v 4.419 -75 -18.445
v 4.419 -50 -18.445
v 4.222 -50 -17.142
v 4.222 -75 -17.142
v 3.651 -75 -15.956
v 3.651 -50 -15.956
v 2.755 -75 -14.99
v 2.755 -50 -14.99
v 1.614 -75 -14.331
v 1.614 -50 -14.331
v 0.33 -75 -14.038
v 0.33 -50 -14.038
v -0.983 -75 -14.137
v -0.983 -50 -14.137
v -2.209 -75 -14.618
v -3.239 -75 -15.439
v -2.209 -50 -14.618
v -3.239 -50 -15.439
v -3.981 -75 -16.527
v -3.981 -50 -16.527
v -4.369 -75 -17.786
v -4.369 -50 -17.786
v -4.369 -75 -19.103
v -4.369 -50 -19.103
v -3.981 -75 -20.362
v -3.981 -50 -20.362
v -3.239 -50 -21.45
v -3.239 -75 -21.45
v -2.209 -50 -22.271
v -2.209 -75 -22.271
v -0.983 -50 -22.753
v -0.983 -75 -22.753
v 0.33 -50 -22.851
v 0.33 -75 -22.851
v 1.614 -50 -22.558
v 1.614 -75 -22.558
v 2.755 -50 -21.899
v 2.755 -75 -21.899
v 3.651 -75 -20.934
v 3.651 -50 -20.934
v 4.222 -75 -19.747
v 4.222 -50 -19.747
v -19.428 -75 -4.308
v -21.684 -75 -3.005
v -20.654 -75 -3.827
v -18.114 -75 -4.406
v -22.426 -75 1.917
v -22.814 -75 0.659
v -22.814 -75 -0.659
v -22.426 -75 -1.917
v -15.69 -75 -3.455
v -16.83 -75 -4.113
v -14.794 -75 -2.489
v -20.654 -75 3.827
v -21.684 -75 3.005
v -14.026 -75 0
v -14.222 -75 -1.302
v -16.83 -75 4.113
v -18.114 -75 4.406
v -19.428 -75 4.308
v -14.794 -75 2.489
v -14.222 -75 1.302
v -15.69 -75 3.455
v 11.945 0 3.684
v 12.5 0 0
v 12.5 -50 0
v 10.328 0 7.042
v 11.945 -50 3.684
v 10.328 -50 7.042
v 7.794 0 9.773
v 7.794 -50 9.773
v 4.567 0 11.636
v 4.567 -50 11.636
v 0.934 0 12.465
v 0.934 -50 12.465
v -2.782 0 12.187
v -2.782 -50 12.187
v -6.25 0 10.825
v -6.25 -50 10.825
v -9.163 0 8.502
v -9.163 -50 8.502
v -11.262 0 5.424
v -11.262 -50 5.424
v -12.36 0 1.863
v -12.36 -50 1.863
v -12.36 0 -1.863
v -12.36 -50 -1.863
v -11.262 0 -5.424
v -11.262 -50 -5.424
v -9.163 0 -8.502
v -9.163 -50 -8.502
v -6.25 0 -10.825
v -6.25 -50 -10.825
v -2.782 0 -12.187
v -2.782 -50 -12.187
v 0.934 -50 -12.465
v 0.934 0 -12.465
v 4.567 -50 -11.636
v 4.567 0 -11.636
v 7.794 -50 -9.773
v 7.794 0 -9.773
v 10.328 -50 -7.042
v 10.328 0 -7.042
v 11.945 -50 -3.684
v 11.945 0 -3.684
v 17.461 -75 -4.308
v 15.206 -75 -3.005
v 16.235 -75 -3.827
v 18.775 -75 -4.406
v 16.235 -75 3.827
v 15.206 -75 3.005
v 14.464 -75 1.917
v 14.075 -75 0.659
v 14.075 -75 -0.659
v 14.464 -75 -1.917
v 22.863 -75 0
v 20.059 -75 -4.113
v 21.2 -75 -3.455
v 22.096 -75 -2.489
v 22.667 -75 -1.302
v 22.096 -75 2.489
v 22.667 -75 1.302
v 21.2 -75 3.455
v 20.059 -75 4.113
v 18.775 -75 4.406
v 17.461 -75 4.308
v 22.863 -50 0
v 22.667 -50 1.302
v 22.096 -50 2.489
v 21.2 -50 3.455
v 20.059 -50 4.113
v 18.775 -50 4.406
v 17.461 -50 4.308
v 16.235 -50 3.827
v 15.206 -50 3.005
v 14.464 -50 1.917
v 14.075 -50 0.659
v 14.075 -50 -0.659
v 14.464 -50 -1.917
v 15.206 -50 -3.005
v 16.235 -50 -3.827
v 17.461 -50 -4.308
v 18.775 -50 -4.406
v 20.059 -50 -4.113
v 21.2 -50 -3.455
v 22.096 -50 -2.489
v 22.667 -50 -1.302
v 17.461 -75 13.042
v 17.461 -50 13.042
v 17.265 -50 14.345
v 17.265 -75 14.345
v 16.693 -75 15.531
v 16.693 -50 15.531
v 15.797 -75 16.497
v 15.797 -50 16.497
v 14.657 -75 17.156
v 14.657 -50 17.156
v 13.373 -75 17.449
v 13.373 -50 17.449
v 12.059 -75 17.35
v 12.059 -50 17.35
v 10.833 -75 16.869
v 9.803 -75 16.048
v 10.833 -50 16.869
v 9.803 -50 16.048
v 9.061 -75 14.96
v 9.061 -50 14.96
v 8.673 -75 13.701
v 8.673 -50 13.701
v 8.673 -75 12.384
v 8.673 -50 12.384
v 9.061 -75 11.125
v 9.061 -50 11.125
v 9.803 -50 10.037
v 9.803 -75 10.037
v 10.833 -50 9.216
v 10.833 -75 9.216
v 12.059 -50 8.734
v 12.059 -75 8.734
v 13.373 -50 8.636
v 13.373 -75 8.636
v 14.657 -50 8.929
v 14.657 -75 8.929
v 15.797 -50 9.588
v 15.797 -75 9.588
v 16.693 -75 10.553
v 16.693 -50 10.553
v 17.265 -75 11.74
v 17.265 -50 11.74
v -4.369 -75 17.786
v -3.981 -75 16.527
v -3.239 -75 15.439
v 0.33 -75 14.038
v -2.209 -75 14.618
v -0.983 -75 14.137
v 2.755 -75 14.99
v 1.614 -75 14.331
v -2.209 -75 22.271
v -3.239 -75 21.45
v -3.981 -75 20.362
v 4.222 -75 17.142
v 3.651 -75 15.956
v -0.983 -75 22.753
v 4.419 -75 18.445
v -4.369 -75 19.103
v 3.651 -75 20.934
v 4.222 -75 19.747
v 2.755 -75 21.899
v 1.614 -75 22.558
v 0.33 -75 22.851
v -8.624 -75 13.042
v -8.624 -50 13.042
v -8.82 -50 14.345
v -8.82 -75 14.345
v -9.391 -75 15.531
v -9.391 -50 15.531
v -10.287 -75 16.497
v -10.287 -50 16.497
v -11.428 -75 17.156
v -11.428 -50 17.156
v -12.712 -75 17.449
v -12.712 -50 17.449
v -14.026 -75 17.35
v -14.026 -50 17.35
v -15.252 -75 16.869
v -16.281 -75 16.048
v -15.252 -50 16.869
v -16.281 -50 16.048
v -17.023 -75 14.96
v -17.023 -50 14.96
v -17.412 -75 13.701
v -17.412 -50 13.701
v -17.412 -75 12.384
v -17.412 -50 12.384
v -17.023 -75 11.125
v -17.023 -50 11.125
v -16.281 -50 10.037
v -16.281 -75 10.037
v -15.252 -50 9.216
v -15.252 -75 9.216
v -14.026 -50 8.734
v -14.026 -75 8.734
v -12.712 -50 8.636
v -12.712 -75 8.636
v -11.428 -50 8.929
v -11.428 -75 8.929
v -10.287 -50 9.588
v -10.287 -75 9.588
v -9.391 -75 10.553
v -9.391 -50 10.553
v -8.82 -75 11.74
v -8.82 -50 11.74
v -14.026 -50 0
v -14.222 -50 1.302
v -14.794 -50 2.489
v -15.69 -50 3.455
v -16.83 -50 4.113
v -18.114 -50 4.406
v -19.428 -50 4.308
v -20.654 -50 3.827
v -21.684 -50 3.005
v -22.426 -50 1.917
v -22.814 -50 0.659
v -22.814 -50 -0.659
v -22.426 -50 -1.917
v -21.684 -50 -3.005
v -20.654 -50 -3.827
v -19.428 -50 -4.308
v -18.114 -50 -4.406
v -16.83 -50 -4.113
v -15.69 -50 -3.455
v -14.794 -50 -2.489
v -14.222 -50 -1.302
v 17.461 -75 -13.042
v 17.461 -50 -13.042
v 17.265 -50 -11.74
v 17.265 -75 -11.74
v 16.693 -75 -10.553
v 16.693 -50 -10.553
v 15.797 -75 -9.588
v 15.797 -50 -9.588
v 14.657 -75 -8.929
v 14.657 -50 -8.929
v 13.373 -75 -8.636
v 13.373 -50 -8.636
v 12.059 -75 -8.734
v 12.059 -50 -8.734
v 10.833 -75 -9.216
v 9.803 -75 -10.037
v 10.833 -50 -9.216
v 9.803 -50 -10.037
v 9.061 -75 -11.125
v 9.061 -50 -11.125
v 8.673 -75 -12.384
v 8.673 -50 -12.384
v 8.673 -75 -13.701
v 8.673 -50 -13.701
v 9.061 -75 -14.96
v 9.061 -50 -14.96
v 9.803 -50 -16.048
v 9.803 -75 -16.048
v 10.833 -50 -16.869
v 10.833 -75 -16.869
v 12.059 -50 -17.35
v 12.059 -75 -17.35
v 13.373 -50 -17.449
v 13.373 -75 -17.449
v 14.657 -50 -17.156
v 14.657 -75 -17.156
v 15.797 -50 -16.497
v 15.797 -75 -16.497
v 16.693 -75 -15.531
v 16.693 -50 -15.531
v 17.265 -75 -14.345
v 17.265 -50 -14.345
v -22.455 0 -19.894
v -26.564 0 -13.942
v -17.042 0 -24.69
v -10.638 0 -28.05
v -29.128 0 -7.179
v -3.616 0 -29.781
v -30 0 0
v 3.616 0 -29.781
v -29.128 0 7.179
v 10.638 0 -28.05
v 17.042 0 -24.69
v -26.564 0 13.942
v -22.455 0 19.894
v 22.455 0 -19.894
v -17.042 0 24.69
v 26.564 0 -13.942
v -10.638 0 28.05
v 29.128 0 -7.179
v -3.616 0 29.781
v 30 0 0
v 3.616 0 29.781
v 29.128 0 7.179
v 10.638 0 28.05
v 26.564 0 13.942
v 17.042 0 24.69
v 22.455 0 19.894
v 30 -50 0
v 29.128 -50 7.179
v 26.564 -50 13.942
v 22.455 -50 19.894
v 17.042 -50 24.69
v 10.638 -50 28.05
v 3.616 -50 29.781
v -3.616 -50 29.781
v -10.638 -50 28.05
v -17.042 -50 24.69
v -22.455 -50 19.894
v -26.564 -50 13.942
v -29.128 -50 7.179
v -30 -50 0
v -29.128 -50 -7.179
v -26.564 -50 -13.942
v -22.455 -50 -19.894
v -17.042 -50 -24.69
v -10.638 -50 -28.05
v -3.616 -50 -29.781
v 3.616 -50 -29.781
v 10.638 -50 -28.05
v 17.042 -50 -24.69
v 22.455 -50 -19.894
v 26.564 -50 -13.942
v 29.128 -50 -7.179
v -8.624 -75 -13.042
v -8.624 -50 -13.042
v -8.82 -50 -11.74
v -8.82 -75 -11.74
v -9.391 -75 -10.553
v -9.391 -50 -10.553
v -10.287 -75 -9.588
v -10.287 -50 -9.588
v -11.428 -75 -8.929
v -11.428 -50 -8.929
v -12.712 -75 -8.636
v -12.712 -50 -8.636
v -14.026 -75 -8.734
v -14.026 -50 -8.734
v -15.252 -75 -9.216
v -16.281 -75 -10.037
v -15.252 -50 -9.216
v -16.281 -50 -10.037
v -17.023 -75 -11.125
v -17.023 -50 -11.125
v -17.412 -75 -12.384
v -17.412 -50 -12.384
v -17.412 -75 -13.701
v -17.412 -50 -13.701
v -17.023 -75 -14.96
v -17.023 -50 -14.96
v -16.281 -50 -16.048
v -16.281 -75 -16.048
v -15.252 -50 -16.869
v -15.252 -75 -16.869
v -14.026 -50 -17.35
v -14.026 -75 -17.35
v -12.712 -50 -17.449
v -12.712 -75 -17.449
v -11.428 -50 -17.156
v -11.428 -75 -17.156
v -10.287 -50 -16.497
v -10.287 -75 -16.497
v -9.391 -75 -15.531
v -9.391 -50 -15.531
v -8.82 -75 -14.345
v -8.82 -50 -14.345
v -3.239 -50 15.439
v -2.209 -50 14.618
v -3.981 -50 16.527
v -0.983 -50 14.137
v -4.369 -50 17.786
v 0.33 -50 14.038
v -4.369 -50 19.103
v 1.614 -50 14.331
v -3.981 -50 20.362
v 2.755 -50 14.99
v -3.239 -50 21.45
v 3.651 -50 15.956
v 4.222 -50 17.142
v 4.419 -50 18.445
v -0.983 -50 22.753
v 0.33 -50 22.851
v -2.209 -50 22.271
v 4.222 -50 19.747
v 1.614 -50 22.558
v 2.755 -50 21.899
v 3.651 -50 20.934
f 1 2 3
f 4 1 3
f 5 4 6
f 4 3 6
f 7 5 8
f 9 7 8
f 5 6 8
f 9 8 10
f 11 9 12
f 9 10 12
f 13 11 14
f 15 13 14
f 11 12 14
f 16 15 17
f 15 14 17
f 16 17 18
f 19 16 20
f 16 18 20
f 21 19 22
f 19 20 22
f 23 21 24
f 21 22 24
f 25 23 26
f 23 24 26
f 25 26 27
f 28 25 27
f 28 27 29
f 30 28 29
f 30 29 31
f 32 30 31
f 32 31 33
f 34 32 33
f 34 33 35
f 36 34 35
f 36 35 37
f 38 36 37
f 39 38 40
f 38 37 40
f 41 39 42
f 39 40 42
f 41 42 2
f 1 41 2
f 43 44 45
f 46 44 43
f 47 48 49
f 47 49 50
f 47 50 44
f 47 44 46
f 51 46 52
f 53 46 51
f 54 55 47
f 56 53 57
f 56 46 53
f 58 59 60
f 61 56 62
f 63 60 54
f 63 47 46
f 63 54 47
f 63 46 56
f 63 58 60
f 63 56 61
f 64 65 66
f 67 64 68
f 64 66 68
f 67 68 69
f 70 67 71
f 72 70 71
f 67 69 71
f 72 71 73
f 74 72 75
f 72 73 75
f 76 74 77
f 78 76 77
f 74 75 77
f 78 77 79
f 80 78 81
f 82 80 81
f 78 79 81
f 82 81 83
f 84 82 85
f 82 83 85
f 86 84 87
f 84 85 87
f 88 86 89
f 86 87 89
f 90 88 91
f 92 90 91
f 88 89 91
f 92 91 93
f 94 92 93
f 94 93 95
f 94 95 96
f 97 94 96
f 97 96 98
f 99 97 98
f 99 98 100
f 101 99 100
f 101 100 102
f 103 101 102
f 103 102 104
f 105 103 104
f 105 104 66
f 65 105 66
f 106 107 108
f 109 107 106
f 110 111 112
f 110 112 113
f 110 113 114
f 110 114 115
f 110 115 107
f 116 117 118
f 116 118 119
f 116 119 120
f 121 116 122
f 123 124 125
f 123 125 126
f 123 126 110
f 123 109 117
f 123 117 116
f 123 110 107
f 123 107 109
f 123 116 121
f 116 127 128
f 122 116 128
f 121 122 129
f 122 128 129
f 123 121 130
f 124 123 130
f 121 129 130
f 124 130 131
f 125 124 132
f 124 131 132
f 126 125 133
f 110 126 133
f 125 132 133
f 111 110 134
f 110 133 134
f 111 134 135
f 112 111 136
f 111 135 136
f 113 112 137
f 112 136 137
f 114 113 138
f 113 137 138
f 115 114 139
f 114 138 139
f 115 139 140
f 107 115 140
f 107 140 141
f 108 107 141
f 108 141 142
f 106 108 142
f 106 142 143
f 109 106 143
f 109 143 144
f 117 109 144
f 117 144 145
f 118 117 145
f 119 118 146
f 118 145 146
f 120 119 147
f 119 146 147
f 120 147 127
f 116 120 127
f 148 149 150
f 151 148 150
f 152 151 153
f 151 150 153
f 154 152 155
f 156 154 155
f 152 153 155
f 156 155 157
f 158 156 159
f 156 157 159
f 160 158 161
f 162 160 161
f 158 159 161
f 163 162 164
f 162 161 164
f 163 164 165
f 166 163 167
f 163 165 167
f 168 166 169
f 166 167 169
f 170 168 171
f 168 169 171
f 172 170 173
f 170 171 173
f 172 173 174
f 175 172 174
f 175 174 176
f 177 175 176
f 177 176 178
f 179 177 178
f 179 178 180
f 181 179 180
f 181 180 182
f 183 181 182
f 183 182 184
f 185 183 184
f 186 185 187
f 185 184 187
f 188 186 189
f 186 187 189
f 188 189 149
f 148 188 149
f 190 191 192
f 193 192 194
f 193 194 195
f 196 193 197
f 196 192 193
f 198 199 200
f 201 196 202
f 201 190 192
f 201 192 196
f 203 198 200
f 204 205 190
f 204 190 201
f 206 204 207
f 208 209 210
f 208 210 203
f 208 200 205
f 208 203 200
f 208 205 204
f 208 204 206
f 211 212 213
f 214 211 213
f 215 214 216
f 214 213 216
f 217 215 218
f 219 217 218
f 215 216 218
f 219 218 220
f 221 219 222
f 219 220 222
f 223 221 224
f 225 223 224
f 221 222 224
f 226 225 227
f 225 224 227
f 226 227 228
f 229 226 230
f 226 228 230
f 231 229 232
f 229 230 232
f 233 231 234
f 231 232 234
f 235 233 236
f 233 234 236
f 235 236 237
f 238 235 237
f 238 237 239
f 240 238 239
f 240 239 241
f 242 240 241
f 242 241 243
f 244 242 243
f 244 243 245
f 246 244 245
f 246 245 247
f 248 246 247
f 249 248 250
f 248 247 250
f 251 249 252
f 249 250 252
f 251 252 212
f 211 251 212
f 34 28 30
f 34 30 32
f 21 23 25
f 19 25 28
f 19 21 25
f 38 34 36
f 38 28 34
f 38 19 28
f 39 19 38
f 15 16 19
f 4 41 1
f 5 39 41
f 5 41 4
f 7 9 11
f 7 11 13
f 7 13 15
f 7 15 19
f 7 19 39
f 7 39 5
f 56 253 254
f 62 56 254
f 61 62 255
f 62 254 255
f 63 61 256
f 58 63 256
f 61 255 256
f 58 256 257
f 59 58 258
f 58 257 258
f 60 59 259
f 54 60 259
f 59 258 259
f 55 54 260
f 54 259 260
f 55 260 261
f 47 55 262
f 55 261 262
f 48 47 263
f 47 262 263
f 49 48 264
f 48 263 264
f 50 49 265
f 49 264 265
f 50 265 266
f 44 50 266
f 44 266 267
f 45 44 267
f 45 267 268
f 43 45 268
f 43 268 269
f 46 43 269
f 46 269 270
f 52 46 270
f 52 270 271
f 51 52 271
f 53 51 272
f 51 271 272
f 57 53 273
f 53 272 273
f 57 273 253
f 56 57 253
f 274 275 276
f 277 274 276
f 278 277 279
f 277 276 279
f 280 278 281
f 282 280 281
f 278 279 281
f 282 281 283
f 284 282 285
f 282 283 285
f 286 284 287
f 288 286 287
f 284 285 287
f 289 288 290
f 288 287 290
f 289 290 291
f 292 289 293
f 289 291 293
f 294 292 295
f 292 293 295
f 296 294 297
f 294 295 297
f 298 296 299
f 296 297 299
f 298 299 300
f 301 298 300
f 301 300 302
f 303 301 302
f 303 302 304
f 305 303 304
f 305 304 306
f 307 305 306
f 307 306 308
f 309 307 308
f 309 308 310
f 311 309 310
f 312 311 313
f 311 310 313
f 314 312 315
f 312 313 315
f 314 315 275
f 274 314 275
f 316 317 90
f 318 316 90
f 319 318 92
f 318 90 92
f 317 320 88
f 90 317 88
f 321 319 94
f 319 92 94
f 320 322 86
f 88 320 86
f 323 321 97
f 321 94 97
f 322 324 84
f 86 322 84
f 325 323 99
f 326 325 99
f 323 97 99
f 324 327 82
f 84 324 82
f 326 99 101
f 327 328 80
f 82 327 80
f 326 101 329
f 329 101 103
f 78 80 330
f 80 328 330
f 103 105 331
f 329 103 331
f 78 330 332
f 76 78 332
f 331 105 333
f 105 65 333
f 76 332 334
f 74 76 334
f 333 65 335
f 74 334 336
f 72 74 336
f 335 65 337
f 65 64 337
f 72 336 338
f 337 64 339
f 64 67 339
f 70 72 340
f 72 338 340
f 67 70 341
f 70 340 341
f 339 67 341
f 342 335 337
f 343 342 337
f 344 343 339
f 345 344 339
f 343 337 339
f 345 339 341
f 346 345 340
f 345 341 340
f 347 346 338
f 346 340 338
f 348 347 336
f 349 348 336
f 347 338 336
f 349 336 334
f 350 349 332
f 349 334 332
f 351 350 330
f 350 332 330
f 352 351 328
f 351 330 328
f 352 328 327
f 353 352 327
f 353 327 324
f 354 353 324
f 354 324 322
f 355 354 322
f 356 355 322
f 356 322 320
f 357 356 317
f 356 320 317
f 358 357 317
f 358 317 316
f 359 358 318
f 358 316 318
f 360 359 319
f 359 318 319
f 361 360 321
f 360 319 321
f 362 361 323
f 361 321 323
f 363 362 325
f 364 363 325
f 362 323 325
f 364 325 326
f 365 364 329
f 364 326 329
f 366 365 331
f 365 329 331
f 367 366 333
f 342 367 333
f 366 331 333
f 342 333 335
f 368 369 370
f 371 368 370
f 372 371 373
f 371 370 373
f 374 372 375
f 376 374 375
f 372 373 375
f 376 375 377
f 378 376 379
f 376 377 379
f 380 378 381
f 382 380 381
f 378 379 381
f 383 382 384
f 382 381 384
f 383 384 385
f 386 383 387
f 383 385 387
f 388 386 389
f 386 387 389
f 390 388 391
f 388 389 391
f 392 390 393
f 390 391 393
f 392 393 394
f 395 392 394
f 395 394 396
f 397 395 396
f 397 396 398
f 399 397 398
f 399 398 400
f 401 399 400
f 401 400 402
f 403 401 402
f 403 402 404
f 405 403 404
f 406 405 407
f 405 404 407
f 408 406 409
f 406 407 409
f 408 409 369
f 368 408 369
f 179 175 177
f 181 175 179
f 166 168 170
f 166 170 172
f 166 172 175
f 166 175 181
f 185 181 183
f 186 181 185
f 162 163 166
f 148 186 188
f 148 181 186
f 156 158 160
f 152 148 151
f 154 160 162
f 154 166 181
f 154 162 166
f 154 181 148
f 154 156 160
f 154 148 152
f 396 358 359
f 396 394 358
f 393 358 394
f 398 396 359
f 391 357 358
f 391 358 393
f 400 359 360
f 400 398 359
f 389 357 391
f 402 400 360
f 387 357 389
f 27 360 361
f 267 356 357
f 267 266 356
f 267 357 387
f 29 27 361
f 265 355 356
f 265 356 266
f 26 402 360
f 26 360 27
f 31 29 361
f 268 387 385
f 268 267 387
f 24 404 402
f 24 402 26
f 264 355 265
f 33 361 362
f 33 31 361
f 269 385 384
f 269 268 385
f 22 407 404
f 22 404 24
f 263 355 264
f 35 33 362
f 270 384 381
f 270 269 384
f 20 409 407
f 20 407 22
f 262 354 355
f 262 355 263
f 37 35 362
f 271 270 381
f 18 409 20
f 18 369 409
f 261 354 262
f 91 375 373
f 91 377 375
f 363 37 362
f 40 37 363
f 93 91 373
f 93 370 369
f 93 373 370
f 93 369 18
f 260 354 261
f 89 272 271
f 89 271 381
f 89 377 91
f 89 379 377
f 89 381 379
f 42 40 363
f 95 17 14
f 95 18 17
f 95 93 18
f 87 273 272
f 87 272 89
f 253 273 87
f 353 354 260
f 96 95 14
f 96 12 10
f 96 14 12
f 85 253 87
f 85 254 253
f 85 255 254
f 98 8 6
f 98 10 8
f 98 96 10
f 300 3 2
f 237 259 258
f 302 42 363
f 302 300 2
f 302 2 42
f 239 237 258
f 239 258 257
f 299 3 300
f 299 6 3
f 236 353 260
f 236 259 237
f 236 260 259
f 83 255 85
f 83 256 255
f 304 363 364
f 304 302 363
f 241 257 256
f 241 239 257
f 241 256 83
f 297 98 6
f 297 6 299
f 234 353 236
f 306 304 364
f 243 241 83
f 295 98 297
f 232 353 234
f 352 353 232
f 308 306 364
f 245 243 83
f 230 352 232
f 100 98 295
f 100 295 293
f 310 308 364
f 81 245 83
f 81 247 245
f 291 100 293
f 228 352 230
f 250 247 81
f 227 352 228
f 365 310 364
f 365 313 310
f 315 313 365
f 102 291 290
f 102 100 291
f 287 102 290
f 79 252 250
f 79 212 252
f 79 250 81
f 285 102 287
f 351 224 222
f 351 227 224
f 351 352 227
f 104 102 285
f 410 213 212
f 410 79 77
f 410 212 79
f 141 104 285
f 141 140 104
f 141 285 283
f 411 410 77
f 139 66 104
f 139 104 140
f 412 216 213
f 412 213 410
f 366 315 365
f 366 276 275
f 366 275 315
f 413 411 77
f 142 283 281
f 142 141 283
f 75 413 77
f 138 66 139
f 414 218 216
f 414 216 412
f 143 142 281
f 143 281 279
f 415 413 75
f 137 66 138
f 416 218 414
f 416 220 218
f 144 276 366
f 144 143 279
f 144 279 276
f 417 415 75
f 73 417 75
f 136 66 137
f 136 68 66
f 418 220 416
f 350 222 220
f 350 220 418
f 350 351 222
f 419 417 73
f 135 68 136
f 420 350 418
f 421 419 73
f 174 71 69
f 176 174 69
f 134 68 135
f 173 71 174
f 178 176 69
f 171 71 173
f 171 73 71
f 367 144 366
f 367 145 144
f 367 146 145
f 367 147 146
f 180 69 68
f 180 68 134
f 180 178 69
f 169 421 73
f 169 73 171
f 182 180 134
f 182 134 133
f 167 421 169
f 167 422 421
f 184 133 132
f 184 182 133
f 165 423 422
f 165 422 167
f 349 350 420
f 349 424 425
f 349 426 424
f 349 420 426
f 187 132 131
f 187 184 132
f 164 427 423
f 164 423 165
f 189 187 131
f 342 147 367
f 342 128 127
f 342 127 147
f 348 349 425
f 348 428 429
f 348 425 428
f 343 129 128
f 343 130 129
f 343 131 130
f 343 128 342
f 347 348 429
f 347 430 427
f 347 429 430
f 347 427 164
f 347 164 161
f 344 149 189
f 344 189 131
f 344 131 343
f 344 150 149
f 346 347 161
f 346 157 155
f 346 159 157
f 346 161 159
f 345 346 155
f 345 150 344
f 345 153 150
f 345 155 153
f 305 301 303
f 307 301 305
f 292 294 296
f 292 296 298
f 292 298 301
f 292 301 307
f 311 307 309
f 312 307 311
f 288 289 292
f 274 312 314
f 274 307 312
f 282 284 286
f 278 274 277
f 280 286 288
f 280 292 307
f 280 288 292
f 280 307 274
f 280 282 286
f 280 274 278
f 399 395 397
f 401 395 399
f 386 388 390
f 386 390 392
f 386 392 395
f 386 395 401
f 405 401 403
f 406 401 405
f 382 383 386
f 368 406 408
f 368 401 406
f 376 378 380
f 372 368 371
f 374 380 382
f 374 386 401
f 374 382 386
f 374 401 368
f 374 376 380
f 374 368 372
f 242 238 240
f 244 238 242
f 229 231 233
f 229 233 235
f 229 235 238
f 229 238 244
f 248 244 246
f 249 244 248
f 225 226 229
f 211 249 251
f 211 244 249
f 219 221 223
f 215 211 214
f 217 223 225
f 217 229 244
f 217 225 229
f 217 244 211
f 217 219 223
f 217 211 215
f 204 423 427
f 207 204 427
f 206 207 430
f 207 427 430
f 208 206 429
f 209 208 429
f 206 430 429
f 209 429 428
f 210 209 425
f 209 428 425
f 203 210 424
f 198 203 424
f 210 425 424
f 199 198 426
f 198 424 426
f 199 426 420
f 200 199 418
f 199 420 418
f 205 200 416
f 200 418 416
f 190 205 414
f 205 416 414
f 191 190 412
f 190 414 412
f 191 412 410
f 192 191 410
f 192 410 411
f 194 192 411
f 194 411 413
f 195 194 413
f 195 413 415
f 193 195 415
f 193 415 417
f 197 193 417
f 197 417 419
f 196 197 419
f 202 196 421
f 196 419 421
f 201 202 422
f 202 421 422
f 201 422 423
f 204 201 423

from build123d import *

# Parameters (mm, degrees)
F0_R     = 30
F1_DEPTH = 50
F2_R     = 12.5
F3_DEPTH = 50.001
F4_R     = 4.418686
F5_DEPTH = 25


with BuildPart() as f1:
    # F0 (on Front) → F1 (new body)
    with BuildSketch(Plane.XZ):
        Circle(F0_R)
    extrude(amount=F1_DEPTH)

    # F2 (on face) → F3 (cut, through all)
    with BuildSketch(Plane.XZ.offset(50)):
        Circle(F2_R)
    extrude(amount=-F3_DEPTH, mode=Mode.SUBTRACT)

    # F4 (on face) → F5 (join)
    with BuildSketch(Plane.XZ.offset(50)):
        with Locations((18.444646, 0)):
            Circle(F4_R)
        with Locations((13.042334, 13.042334)):
            Circle(F4_R)
        with Locations((0, 18.444646)):
            Circle(F4_R)
        with Locations((-13.042334, 13.042334)):
            Circle(F4_R)
        with Locations((-18.444646, 0)):
            Circle(F4_R)
        with Locations((-13.042334, -13.042334)):
            Circle(F4_R)
        with Locations((0, -18.444646)):
            Circle(F4_R)
        with Locations((13.042334, -13.042334)):
            Circle(F4_R)
    extrude(amount=F5_DEPTH)


solid = f1.part
